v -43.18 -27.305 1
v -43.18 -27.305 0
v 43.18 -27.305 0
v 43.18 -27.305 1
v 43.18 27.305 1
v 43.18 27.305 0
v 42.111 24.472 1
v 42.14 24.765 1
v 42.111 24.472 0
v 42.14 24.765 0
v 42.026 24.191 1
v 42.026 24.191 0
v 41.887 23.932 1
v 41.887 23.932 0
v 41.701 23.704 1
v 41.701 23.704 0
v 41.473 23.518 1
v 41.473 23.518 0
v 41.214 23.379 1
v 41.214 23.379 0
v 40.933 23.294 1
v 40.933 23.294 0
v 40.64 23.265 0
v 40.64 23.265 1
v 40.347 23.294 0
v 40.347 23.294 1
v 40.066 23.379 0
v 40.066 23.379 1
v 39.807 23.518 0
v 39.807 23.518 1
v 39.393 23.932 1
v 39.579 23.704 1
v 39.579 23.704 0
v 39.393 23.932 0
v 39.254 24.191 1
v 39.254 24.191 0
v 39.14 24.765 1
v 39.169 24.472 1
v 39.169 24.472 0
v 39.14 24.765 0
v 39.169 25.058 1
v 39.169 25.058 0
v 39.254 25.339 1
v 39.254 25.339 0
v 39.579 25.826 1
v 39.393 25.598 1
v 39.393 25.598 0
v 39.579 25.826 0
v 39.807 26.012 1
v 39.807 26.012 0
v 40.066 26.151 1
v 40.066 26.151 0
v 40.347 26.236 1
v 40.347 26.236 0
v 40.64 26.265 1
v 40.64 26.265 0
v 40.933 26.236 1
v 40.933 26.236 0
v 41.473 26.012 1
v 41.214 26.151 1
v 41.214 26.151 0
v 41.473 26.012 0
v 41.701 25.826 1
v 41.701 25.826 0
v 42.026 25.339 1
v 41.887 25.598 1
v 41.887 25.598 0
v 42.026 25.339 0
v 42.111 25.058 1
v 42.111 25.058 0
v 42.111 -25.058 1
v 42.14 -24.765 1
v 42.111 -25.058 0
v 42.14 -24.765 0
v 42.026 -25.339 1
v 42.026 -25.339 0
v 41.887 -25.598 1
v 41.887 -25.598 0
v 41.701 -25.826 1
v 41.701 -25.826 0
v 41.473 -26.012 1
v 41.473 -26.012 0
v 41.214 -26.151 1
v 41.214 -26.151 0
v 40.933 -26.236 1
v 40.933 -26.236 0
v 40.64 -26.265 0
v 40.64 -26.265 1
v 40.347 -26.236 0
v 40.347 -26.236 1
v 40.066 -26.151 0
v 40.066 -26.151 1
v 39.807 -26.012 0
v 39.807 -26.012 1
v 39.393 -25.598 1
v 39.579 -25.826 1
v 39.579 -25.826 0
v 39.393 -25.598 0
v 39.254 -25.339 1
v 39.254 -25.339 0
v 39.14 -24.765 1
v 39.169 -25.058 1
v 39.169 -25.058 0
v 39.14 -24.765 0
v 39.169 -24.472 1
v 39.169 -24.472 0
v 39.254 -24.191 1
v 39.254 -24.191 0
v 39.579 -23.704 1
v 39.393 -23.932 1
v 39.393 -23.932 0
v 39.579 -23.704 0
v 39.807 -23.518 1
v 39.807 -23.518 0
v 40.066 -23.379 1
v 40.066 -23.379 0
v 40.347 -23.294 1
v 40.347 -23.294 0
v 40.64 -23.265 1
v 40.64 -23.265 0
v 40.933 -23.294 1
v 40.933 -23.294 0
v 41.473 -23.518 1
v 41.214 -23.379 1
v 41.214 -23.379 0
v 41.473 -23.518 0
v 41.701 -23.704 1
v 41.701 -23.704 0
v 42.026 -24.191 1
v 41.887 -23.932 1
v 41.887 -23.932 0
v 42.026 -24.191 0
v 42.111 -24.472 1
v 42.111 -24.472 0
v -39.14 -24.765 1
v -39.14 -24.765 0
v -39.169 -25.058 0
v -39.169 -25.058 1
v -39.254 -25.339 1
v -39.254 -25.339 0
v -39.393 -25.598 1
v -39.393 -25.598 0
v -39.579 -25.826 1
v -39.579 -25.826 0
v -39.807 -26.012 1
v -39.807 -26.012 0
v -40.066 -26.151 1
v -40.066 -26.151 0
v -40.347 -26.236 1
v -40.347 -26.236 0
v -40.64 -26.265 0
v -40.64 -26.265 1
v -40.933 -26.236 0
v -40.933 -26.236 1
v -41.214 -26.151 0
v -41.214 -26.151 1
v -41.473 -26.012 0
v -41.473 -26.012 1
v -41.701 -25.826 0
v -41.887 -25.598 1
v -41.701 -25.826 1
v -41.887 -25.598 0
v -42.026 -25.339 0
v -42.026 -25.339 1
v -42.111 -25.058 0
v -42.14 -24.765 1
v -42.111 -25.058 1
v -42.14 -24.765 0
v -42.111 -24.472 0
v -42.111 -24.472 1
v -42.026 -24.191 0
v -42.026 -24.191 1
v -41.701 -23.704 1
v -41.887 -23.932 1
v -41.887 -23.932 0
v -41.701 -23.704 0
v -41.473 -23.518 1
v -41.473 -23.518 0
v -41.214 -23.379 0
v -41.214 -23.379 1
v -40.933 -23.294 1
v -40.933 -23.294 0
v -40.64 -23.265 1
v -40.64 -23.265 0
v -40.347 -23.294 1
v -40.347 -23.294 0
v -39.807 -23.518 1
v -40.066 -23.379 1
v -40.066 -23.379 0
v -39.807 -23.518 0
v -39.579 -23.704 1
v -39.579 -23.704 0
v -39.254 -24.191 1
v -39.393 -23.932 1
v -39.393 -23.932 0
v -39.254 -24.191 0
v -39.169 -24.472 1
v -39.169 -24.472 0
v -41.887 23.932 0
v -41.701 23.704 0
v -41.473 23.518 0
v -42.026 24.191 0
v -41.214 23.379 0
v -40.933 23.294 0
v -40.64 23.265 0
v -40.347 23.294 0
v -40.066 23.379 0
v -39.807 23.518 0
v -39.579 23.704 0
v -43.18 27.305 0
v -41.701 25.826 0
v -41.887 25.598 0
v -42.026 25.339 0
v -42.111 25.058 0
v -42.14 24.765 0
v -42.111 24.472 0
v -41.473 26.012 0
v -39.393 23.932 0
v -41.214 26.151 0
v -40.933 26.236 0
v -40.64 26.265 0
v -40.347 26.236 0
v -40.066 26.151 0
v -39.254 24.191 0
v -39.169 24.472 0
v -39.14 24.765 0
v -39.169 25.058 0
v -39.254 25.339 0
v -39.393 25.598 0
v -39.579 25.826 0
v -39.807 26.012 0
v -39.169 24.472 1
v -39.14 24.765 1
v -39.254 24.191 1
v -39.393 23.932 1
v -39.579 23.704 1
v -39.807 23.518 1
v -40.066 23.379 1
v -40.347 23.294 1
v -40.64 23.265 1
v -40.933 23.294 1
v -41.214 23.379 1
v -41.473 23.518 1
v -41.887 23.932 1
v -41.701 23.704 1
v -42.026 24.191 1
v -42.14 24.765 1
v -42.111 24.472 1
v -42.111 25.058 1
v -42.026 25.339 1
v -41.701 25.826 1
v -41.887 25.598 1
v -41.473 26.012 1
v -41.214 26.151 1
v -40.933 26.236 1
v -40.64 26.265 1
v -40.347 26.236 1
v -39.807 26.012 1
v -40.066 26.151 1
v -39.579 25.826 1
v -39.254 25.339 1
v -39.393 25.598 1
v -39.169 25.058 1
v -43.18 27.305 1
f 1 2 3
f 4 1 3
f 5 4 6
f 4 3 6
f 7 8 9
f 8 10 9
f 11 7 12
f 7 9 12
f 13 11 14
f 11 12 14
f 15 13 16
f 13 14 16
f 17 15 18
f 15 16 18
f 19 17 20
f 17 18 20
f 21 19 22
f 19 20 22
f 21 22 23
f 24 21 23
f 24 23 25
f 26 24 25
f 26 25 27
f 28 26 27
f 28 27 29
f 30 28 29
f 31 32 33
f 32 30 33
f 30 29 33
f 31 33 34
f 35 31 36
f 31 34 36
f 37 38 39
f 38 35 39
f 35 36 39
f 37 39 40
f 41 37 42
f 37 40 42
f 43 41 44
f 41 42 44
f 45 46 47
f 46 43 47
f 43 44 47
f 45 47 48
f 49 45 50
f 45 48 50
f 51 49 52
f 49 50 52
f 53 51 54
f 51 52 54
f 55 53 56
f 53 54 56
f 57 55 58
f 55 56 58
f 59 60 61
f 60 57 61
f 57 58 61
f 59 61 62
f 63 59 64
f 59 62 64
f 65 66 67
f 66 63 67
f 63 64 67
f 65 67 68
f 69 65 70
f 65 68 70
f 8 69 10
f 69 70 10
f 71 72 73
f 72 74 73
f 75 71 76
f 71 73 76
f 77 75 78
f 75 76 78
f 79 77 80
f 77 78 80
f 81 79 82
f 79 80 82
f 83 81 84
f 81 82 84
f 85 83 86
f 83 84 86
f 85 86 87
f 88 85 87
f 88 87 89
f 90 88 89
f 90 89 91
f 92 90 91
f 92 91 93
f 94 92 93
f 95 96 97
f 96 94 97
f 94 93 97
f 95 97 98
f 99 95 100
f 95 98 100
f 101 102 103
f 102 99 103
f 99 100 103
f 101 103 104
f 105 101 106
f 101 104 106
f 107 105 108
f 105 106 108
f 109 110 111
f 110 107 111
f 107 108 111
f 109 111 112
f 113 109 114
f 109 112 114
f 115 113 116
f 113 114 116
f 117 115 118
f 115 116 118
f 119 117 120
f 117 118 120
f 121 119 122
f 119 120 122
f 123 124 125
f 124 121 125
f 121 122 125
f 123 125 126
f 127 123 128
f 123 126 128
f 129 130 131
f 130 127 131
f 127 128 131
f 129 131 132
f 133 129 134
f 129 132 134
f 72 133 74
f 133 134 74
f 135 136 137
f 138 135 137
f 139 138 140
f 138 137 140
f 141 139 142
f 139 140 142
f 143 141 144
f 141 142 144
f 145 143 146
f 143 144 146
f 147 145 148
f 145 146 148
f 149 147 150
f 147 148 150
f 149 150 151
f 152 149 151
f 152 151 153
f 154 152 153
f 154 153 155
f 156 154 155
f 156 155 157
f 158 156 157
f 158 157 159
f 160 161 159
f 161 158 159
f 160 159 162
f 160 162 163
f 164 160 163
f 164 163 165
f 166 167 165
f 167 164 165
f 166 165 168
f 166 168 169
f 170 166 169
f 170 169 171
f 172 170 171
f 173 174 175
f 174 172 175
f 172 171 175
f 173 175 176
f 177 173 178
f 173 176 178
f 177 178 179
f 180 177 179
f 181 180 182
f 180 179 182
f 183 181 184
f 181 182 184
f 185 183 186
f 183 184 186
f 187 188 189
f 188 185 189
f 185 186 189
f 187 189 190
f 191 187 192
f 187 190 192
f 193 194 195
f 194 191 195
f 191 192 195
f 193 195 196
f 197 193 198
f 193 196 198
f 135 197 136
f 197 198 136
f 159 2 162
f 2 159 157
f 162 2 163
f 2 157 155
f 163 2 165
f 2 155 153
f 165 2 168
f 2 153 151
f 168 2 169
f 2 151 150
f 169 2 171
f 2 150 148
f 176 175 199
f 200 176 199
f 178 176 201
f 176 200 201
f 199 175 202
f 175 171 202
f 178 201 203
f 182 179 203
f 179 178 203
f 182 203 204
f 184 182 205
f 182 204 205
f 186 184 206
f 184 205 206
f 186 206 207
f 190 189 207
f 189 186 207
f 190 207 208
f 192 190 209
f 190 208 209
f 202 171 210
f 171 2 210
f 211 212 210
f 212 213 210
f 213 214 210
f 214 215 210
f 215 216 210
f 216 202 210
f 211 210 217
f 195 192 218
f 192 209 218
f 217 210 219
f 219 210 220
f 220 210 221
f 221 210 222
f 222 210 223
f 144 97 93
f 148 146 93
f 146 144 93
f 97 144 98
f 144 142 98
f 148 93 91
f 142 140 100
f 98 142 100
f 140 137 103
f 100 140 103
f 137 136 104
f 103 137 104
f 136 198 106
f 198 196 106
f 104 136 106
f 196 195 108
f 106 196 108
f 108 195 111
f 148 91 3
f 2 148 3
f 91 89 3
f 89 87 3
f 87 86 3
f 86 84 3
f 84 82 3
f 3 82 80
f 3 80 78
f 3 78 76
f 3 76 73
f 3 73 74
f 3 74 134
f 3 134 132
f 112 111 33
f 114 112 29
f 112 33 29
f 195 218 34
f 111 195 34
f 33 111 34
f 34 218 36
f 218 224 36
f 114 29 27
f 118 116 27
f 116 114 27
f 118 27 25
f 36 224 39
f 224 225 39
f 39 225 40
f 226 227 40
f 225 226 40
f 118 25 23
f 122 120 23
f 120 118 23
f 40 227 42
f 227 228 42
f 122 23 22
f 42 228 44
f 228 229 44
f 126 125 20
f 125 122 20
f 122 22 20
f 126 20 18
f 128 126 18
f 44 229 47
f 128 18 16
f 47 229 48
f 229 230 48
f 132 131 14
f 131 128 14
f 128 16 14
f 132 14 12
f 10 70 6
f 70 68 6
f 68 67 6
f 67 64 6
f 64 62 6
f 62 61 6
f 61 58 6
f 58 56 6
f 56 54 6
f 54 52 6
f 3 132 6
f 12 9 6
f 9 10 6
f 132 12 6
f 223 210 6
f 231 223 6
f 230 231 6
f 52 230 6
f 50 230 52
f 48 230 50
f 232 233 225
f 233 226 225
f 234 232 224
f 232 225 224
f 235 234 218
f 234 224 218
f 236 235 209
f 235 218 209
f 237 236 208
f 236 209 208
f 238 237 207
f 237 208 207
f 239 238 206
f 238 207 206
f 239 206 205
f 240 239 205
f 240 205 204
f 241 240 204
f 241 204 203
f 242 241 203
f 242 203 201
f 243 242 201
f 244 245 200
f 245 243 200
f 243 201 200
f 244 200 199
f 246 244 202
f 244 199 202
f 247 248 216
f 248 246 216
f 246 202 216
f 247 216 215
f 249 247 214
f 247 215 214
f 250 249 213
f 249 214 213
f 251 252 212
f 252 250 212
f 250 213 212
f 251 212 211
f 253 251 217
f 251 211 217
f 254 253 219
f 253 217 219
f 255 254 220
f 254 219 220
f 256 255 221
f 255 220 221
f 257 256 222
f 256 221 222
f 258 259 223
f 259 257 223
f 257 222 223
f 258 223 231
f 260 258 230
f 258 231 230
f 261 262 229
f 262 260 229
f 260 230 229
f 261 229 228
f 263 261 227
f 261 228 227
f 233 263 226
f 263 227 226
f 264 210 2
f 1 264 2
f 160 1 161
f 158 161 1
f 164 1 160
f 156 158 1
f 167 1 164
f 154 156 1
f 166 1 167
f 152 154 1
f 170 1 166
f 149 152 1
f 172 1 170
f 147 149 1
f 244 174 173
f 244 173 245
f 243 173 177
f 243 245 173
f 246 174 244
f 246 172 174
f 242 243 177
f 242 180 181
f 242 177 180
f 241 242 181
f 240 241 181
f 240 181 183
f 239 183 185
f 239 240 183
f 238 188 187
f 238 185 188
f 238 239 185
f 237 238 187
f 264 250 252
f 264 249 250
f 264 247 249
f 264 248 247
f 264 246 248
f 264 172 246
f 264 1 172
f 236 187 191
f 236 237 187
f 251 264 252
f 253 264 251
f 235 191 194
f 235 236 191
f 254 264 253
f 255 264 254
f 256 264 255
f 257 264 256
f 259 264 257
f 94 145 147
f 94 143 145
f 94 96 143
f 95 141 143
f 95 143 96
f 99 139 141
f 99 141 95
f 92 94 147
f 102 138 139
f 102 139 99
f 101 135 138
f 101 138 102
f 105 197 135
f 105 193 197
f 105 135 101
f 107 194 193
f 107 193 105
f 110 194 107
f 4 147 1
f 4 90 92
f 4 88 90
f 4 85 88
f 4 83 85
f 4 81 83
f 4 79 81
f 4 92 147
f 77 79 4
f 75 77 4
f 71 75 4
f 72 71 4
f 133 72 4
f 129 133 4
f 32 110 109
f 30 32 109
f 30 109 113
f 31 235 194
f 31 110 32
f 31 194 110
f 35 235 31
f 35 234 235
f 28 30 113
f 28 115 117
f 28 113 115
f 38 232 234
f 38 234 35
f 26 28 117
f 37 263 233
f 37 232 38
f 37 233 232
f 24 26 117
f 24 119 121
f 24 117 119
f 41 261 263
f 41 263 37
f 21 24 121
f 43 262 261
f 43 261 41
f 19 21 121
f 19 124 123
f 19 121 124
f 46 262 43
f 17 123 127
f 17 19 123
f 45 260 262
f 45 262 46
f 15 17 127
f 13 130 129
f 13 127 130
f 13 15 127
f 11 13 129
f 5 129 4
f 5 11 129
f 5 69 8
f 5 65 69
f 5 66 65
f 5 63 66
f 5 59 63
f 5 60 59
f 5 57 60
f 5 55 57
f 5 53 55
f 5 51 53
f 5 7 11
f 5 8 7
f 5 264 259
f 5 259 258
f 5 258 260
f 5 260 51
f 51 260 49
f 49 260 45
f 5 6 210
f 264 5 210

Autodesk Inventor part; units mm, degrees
ref_plane "YZ Plane" through (0, 0, 0) normal (1, 0, 0) x (0, 1, 0)
ref_plane "XZ Plane" through (0, 0, 0) normal (0, 1, 0) x (-1, 0, 0)
ref_plane "XY Plane" through (0, 0, 0) normal (0, 0, 1) x (1, 0, 0)
sketch "Sketch1" plane through (0, 0, 0) normal (0, 0, 1) x (1, 0, 0)
  line L0 (-43.18, -27.305) -> (43.18, -27.305)
  line L1 (43.18, -27.305) -> (43.18, 27.305)
  line L2 (43.18, 27.305) -> (-43.18, 27.305)
  line L3 (-43.18, 27.305) -> (-43.18, -27.305)
  line L4 (-43.18, -27.305) -> (43.18, 27.305) construction
  line L5 (43.18, -27.305) -> (-43.18, 27.305) construction
  circle A0 centre (-40.64, 24.765) radius 1.5
  line L6 (-43.18, 0) -> (43.18, 0) construction
  line L7 (0, 27.305) -> (0, -27.305) construction
  circle A1 centre (-40.64, -24.765) radius 1.5
  circle A2 centre (40.64, 24.765) radius 1.5
  circle A3 centre (40.64, -24.765) radius 1.5
  point P0 (0, 0)
  dimension "d2" = 86.36
  dimension "d4" = 54.61
  dimension "d6" = 3
  dimension "d21" = 2.54
  dimension "d22" = 2.54
extrude "Extrusion1" add sketch "Sketch1" along normal blind 1
properties part number "Parallella" material "PCB(1)"
